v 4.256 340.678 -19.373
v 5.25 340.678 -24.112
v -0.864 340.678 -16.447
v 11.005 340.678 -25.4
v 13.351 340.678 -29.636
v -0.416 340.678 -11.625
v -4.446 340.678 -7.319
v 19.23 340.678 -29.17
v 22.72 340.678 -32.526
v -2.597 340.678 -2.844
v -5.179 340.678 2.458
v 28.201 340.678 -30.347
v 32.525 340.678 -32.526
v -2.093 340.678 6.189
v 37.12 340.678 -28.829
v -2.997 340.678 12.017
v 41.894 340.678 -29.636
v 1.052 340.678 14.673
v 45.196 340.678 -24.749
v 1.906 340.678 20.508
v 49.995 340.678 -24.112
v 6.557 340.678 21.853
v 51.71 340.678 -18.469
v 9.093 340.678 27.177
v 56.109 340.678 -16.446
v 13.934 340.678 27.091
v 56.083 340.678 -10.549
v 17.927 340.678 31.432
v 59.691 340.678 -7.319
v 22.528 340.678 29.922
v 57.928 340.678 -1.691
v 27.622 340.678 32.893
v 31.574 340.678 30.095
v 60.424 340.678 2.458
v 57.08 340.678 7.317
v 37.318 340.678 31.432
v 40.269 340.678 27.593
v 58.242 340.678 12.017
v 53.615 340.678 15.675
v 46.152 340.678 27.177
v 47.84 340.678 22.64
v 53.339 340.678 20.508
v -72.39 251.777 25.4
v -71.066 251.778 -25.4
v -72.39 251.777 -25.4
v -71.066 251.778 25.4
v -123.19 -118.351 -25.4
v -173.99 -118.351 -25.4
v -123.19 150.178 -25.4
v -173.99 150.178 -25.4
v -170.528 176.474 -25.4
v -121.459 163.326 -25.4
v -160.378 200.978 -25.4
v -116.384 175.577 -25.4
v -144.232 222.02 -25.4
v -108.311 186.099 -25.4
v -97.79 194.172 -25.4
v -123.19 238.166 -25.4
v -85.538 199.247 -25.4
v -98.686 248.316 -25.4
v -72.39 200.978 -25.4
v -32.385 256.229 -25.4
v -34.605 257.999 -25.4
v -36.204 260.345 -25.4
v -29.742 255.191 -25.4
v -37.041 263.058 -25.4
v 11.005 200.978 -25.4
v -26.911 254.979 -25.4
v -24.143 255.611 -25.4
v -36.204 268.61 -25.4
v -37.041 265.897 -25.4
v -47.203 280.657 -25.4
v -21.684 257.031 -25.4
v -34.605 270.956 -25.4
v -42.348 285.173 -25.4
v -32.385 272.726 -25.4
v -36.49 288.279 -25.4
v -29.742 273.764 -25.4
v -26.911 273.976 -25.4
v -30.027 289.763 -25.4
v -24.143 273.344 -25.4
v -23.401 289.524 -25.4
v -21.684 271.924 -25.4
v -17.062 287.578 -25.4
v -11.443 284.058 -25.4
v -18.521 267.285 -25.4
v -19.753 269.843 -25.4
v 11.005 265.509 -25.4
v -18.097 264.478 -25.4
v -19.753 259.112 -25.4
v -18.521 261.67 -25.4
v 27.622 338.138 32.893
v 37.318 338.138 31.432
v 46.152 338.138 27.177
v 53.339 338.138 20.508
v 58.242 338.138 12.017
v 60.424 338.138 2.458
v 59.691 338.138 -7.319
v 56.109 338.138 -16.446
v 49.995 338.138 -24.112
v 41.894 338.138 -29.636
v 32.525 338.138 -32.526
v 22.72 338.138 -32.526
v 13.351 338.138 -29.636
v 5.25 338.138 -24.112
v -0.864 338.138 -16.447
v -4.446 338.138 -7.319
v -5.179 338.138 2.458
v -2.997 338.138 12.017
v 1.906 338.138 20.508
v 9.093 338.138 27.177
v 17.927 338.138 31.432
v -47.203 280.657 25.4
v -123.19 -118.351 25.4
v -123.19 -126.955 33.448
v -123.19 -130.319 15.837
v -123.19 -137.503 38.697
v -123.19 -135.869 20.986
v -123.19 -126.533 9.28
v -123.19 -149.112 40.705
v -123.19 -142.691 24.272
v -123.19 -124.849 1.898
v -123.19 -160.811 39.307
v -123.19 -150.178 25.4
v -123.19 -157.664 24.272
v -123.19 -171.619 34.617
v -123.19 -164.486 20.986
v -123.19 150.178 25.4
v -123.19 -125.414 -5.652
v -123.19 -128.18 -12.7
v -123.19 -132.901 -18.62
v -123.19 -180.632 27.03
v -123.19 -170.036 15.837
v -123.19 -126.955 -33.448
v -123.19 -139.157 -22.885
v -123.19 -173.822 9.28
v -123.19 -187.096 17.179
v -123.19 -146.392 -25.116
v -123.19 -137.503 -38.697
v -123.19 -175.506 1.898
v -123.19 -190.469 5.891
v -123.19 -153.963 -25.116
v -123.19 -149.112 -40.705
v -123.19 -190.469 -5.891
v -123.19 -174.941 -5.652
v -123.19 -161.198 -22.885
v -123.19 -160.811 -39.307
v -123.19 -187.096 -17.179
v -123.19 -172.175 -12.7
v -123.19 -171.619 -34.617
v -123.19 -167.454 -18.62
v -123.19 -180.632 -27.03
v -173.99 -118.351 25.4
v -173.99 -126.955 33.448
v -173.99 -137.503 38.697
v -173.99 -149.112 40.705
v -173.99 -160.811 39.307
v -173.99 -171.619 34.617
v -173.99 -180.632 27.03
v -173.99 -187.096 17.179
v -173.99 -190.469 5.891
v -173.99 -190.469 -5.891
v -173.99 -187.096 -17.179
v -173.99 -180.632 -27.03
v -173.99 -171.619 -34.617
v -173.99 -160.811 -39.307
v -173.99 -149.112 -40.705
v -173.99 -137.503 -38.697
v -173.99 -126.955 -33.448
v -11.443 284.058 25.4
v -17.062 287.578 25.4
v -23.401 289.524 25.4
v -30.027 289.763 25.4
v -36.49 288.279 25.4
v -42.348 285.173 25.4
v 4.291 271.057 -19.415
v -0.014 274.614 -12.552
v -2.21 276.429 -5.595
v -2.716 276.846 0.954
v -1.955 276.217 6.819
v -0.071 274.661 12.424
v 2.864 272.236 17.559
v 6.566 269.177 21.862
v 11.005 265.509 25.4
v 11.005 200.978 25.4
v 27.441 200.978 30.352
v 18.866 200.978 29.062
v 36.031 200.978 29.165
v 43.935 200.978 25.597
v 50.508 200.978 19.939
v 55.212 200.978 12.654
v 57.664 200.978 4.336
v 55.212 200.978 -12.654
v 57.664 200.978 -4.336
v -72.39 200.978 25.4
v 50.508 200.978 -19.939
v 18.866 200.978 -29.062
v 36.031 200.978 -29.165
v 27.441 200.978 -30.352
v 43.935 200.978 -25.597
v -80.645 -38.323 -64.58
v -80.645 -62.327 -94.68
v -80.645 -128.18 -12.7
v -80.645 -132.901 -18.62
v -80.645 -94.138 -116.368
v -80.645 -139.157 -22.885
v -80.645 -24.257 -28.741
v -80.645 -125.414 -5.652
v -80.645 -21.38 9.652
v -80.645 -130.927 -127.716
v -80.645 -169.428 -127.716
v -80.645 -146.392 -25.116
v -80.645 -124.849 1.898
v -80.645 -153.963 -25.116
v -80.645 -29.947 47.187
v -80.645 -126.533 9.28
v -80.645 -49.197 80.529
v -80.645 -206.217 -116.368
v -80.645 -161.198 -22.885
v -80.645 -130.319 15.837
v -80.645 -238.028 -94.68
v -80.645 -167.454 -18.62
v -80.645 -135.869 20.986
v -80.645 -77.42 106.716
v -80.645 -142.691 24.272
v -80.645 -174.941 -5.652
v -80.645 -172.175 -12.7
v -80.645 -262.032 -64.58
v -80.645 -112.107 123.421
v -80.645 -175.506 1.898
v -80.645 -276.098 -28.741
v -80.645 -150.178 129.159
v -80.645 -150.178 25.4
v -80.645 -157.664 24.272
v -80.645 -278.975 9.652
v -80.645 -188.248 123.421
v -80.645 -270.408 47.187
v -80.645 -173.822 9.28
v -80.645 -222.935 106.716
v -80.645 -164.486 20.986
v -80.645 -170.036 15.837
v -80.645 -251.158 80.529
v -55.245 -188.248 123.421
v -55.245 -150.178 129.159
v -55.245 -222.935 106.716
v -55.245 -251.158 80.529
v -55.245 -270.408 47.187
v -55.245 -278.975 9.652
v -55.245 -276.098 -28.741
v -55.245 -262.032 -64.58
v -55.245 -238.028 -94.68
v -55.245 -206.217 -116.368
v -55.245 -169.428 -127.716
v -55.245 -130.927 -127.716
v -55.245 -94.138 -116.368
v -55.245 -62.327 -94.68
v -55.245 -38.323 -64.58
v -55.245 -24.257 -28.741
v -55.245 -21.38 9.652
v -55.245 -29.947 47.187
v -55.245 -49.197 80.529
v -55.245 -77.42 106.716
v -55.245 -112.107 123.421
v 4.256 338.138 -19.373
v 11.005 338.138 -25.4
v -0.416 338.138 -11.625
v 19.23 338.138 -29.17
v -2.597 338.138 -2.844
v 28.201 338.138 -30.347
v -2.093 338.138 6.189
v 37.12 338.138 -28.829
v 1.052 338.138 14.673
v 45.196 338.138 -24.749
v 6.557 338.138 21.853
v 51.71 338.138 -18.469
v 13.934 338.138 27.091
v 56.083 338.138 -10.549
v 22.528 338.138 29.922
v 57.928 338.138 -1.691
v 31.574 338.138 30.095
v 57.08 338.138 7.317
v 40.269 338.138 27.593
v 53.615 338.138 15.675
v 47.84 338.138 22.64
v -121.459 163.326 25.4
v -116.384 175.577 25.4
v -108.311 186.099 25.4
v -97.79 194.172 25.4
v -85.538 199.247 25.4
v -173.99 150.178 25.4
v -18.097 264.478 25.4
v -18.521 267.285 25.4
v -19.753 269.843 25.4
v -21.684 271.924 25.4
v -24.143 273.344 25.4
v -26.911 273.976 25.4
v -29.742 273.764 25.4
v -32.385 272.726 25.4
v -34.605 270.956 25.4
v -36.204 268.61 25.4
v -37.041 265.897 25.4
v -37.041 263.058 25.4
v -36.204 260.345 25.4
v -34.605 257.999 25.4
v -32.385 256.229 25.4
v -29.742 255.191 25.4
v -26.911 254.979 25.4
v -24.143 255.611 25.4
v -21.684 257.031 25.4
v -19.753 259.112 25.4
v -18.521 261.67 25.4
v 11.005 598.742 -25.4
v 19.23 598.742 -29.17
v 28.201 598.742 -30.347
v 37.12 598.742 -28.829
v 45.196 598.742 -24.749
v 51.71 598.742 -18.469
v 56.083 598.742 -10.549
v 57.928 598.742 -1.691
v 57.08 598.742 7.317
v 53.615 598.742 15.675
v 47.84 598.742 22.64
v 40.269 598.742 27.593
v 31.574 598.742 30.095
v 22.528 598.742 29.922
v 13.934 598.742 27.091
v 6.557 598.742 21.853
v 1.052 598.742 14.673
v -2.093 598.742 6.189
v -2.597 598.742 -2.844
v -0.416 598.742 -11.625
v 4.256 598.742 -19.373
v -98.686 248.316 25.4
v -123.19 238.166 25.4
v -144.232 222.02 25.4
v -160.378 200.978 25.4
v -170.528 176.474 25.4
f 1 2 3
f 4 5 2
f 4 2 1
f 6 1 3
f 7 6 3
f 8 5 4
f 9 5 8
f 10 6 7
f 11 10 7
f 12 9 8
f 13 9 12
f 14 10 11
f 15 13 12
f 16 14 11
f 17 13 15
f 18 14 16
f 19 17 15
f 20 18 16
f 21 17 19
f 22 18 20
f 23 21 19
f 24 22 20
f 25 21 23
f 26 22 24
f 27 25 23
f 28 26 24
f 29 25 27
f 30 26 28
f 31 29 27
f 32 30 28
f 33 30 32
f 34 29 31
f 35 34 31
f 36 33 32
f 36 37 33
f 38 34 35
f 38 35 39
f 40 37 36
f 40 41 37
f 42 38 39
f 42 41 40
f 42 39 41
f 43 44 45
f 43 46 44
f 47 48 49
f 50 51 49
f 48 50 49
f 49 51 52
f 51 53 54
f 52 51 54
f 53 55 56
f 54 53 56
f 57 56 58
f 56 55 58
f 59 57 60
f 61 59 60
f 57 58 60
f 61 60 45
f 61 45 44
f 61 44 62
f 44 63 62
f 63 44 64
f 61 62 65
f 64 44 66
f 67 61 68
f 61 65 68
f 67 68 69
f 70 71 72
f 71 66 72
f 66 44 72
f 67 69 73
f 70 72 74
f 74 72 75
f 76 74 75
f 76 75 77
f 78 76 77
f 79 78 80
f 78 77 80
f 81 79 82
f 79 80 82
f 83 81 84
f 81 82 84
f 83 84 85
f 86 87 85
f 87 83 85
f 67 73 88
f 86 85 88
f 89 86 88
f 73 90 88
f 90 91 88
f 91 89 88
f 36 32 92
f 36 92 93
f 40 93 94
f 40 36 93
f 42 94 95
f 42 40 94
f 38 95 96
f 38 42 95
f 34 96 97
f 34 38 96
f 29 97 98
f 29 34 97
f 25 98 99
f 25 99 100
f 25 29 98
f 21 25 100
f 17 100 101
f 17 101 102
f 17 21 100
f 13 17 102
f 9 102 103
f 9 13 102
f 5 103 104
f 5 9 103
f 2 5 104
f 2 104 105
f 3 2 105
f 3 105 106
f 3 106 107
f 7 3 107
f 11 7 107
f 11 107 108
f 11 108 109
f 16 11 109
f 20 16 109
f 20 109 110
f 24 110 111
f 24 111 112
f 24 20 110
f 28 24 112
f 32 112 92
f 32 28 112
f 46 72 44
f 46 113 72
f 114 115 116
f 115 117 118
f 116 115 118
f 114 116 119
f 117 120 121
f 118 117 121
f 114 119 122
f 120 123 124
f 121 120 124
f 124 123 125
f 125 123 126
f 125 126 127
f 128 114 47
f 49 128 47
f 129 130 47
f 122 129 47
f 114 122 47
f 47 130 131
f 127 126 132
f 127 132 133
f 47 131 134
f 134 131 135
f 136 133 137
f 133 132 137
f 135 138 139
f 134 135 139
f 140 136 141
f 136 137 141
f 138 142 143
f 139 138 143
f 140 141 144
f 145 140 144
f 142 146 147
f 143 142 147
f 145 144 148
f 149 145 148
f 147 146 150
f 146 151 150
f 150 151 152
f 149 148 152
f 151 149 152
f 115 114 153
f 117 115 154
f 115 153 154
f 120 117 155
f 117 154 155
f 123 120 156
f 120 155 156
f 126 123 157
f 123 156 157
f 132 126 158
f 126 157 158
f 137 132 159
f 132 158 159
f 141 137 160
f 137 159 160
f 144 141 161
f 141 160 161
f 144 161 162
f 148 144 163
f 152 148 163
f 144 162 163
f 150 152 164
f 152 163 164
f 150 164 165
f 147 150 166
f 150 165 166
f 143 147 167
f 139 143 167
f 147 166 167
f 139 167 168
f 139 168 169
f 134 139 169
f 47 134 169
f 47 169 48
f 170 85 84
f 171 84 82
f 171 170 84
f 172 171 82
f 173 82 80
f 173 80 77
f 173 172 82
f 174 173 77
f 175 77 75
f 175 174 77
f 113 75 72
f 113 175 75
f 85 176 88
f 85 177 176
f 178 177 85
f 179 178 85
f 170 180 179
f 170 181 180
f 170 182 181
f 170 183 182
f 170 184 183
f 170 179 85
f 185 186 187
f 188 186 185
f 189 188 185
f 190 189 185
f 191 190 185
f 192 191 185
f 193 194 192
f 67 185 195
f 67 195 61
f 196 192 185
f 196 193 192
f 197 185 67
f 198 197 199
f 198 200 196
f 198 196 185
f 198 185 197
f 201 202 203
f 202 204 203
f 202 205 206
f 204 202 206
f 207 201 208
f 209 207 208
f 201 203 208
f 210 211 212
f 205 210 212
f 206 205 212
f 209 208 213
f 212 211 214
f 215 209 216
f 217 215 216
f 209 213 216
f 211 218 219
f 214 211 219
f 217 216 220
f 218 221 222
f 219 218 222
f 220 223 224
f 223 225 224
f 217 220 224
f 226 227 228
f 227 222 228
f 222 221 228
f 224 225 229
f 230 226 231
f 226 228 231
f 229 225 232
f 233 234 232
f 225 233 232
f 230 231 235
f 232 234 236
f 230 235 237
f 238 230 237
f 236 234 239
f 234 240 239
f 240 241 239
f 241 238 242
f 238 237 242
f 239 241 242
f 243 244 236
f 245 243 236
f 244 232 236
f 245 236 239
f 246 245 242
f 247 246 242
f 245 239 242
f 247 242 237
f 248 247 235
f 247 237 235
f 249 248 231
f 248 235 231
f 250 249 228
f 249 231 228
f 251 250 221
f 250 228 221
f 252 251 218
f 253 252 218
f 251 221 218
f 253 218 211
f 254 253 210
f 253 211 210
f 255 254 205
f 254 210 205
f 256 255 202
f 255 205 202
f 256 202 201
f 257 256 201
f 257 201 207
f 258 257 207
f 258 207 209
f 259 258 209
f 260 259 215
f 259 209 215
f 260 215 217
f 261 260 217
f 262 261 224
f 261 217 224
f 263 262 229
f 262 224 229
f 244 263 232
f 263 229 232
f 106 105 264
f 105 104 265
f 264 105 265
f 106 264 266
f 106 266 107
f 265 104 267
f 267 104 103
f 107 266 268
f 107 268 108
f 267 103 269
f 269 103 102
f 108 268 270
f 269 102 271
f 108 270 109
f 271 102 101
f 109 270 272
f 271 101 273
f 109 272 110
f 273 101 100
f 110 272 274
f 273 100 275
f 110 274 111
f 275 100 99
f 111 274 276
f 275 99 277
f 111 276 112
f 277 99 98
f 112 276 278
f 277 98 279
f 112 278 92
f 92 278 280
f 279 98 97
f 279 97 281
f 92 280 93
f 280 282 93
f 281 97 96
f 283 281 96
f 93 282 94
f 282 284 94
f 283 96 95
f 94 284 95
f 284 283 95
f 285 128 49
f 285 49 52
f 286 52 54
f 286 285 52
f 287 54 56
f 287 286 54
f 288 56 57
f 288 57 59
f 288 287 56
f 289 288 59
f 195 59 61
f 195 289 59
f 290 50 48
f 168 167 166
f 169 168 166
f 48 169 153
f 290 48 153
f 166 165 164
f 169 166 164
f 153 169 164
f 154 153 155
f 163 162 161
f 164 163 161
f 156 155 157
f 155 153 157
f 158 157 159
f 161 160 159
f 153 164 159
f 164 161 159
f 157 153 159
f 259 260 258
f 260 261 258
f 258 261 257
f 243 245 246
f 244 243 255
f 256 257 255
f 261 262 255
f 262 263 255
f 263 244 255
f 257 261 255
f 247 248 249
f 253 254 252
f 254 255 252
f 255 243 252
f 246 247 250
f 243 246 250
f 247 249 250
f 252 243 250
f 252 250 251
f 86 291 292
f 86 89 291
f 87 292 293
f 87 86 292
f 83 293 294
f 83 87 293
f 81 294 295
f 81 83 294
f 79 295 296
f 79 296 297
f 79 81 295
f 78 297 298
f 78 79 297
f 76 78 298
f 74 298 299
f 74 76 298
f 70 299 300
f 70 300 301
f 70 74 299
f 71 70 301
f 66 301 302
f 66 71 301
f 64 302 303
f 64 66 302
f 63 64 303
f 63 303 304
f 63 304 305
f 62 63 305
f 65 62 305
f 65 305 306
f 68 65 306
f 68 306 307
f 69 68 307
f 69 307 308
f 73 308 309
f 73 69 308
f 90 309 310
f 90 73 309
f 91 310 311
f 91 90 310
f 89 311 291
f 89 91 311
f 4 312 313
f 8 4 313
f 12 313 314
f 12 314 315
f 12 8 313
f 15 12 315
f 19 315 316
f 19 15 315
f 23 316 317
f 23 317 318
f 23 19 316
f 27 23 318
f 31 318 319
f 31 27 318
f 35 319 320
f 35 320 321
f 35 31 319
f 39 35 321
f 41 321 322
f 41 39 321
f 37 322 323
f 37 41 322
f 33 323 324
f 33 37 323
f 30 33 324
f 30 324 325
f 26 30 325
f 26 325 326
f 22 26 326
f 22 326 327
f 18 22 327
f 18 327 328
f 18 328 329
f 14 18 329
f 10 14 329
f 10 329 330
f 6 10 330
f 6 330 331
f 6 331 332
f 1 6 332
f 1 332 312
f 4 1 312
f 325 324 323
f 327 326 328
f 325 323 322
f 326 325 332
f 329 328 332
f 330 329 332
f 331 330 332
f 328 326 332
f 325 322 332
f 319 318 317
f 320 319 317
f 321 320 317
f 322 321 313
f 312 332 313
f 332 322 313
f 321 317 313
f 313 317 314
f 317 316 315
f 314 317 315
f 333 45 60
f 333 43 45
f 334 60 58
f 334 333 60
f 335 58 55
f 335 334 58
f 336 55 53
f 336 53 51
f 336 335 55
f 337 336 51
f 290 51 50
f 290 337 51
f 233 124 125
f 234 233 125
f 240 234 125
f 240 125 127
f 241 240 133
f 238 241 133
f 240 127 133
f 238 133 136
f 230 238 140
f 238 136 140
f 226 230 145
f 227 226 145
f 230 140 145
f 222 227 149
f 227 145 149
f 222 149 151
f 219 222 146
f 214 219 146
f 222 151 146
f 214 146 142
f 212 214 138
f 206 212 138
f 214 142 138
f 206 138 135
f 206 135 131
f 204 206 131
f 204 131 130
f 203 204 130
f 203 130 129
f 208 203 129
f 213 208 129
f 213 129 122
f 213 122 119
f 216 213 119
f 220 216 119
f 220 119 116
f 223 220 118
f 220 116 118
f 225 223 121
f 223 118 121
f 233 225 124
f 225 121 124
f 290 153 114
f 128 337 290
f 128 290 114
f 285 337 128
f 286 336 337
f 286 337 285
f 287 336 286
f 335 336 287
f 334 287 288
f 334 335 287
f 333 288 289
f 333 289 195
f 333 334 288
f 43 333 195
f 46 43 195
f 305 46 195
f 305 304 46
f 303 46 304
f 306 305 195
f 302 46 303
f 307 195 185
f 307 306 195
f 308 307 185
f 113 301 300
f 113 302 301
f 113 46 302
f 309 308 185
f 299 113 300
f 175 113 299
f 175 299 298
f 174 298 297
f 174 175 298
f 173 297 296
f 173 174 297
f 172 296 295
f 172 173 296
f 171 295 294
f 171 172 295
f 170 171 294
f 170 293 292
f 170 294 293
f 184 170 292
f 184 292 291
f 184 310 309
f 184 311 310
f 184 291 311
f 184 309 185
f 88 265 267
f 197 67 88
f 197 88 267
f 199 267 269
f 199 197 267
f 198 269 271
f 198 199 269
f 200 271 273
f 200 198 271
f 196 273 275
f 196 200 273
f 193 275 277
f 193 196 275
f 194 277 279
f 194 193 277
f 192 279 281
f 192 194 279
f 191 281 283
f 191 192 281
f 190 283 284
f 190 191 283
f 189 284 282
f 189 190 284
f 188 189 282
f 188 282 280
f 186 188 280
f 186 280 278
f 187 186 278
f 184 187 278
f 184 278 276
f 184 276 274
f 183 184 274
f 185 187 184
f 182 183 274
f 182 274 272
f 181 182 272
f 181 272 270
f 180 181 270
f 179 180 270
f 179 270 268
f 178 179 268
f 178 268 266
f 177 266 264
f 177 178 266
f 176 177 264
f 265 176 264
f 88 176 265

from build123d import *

# Parameters (mm, degrees)
SKETCH1_R           = 9.525
BOSS_EXTRUDE1_DEPTH = 25.4
SKETCH3_R           = 30.353
BOSS_EXTRUDE2_DEPTH = 397.764
SKETCH4_R           = 32.893
BOSS_EXTRUDE3_DEPTH = 2.54


with BuildPart() as part:
    # Sketch1 → Boss-Extrude1 (new, symmetric)
    with BuildSketch(Plane.XY):
        with BuildLine():
            Line((-123.19, -150.1775), (-123.19, 150.1775))
            ThreePointArc((-123.19, 150.1775), (-108.311024484, 186.098524484), (-72.39, 200.9775))
            Line((-72.39, 200.9775), (27.6225, 200.9775))
            Line((27.6225, 200.9775), (27.6225, 251.7775))
            Line((27.6225, 251.7775), (-11.443122974, 284.057790065))
            ThreePointArc((-11.443122974, 284.057790065), (-30.027308672, 289.763403093), (-47.202790065, 280.656877026))
            Line((-47.202790065, 280.656877026), (-71.066089722, 251.7775))
            Line((-71.066089722, 251.7775), (-72.39, 251.7775))
            ThreePointArc((-72.39, 251.7775), (-144.232048969, 222.019548969), (-173.99, 150.1775))
            Line((-173.99, 150.1775), (-173.99, -150.1775))
            Line((-173.99, -150.1775), (-123.19, -150.1775))
        make_face()
        with Locations((-27.6225, 264.4775)):
            Circle(SKETCH1_R, mode=Mode.SUBTRACT)
    extrude(amount=BOSS_EXTRUDE1_DEPTH, both=True)

    # Sketch2 → Revolve1 (revolve)
    with BuildSketch(Plane.XZ.offset(150.1775)):
        Polygon((-173.99, 0), (-123.19, 0), (-55.245, 0), (-55.245, 129.159), (-80.645, 129.159), (-80.645, 25.4), (-123.19, 25.4), (-123.19, 40.719375), (-173.99, 40.719375), align=None)
    revolve(axis=Axis((-173.99, -150.1775, 0), (1, 0, 0)))

    # Sketch3 → Boss-Extrude2 (add)
    with BuildSketch(Plane.XZ.offset(-200.9775)):
        with Locations(Location((27.6225, 0, 0), (0, 0, 236.805836124))):
            Circle(SKETCH3_R)
    extrude(amount=-BOSS_EXTRUDE2_DEPTH)

    # Sketch4 → Boss-Extrude3 (add)
    with BuildSketch(Plane(origin=(0, 340.6775, 0), x_dir=(1, 0, 0), z_dir=(0, 1, 0))):
        with Locations(Location((27.6225, 0, 0), (0, 0, 270))):
            Circle(SKETCH4_R)
    extrude(amount=-BOSS_EXTRUDE3_DEPTH)


solid = part.part
